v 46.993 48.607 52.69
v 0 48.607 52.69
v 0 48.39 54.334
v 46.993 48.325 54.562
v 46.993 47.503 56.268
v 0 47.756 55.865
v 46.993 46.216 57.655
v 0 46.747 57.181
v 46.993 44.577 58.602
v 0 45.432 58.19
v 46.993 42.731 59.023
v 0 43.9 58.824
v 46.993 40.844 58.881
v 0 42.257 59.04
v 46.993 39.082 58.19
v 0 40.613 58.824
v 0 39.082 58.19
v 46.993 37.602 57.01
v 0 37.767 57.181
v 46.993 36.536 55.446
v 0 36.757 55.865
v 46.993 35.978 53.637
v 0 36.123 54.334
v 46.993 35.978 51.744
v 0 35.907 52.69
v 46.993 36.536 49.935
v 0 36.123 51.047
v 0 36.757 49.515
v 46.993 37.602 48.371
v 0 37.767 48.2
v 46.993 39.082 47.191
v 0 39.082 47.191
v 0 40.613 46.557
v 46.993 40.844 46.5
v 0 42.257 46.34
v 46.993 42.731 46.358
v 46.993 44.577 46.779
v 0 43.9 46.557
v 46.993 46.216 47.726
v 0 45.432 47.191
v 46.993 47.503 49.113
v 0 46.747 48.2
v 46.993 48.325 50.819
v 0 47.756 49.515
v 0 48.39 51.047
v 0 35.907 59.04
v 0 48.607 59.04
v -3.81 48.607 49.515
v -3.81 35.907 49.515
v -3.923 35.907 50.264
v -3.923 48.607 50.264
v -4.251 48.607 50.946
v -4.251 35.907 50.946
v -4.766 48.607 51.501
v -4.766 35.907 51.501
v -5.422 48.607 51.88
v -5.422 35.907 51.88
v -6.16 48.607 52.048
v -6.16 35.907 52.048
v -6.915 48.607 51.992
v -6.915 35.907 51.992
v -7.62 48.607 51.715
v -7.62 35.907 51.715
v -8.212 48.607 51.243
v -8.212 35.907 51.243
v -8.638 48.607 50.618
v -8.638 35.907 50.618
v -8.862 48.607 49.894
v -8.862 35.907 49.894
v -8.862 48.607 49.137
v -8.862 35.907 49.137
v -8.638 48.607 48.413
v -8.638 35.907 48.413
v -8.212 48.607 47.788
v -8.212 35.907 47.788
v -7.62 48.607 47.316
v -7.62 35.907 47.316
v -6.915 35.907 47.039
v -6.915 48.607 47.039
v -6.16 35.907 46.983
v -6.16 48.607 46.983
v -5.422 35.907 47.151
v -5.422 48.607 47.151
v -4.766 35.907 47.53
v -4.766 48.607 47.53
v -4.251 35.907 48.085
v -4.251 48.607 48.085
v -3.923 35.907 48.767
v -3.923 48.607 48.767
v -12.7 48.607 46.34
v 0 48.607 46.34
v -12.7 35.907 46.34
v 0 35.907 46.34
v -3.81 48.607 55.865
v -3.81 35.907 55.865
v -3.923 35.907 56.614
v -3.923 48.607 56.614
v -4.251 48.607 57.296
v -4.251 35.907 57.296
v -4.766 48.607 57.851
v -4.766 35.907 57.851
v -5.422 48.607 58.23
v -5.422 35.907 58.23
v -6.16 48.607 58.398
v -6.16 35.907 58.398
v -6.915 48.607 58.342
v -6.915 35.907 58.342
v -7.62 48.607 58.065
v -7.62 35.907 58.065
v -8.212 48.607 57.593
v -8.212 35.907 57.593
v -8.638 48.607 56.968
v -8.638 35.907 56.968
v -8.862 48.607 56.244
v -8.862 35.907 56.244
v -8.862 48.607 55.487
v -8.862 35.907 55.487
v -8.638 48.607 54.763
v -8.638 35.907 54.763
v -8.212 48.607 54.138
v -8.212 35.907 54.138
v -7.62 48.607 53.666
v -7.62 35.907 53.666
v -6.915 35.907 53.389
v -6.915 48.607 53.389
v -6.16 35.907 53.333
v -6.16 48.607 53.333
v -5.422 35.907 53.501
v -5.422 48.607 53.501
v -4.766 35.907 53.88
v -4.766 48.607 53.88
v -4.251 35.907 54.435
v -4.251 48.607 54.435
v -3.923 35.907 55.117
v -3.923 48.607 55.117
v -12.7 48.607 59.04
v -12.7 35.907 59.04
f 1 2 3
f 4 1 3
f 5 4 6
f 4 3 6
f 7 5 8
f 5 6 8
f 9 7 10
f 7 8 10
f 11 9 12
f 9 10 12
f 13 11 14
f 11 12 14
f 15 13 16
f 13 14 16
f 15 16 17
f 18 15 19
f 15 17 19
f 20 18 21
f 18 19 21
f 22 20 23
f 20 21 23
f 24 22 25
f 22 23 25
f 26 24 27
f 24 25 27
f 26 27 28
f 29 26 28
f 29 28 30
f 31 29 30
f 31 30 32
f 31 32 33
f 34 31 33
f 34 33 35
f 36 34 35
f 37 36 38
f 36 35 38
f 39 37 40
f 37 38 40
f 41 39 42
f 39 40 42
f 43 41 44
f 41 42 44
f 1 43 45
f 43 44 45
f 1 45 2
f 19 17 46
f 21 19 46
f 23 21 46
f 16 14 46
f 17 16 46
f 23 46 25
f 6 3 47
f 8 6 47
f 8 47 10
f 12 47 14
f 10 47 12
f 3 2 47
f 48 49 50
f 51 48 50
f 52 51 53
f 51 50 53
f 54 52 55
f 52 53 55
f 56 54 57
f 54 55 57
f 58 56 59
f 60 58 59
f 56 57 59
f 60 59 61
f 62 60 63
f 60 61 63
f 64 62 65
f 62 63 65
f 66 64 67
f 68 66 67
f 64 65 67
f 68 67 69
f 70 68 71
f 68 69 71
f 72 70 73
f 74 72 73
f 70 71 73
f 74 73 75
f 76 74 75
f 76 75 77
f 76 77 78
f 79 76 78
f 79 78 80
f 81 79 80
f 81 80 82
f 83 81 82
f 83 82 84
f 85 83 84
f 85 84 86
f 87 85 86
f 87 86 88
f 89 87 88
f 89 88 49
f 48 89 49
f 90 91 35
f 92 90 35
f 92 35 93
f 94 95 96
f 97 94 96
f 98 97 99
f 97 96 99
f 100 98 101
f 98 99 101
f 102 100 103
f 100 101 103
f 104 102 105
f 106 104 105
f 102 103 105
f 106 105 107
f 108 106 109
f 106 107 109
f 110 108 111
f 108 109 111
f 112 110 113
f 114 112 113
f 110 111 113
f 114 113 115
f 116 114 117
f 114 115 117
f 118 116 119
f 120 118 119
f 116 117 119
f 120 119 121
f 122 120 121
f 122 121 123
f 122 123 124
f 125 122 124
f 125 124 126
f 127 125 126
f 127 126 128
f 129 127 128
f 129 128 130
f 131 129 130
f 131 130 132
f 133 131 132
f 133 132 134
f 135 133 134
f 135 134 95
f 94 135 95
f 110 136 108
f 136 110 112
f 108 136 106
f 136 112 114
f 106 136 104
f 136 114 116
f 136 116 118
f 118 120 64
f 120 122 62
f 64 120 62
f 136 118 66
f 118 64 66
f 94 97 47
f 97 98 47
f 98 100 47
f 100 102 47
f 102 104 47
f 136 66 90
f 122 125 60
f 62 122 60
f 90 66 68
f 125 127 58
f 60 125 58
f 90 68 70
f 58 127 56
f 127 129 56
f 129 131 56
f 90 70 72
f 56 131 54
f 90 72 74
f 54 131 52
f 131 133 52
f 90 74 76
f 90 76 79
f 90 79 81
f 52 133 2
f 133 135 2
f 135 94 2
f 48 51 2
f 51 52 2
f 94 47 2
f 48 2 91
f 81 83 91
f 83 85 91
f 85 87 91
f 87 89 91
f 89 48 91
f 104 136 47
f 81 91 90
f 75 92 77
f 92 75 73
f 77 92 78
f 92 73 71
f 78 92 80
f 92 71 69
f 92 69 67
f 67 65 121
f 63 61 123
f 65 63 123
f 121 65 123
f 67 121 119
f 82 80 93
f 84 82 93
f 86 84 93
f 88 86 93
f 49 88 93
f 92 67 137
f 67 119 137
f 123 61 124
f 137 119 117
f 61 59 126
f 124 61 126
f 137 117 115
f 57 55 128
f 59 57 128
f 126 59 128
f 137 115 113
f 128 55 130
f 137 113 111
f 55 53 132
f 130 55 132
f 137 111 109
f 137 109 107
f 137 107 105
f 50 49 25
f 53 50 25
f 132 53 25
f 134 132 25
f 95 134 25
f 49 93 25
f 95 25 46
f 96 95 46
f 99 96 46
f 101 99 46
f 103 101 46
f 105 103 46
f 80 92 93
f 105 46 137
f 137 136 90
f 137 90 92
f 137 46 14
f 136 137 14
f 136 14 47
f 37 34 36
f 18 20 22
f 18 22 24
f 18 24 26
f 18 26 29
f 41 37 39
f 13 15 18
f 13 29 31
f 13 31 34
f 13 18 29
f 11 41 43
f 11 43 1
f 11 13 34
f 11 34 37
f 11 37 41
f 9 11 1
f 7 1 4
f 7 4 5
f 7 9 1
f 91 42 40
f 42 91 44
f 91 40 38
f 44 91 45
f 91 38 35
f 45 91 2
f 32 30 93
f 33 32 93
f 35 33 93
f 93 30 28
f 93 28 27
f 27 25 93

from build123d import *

# Parameters (mm, degrees)
F0_R     = 6.35
F1_DEPTH = 46.99328
F3_DEPTH = 12.7
F5_D     = 5.08
F5_DEPTH = 25.4
F5_TIP   = 1.5261859723


with BuildPart() as f1:
    # F0 (on Right) → F1 (new body)
    with BuildSketch(Plane.YZ):
        with Locations((42.2567352653, 52.6904910803)):
            Circle(F0_R)
    extrude(amount=F1_DEPTH)

    # F2 (on face) → F3 (join)
    with BuildSketch(Plane(origin=(0, 0, 0), x_dir=(0, -1, 0), z_dir=(-1, 0, 0))):
        with BuildLine():
            Line((-42.2567352653, 59.0404910803), (-48.6067352653, 59.0404910803))
            Line((-48.6067352653, 59.0404910803), (-48.6067352653, 52.6904910803))
            ThreePointArc((-48.6067352653, 52.6904910803), (-46.7468633258, 57.1806191408), (-42.2567352653, 59.0404910803))
        make_face()
        with BuildLine():
            Line((-35.9067352653, 59.0404910803), (-42.2567352653, 59.0404910803))
            ThreePointArc((-42.2567352653, 59.0404910803), (-37.7666072047, 57.1806191408), (-35.9067352653, 52.6904910803))
            Line((-35.9067352653, 52.6904910803), (-35.9067352653, 59.0404910803))
        make_face()
        with BuildLine():
            ThreePointArc((-35.9067352653, 52.6904910803), (-37.7666072047, 57.1806191408), (-42.2567352653, 59.0404910803))
            ThreePointArc((-42.2567352653, 59.0404910803), (-46.7468633258, 57.1806191408), (-48.6067352653, 52.6904910803))
            ThreePointArc((-48.6067352653, 52.6904910803), (-46.7468633258, 48.2003630197), (-42.2567352653, 46.3404910803))
            ThreePointArc((-42.2567352653, 46.3404910803), (-37.7666072047, 48.2003630197), (-35.9067352653, 52.6904910803))
        make_face()
        with BuildLine():
            ThreePointArc((-42.2567352653, 46.3404910803), (-46.7468633258, 48.2003630197), (-48.6067352653, 52.6904910803))
            Line((-48.6067352653, 52.6904910803), (-48.6067352653, 46.3404910803))
            Line((-48.6067352653, 46.3404910803), (-42.2567352653, 46.3404910803))
        make_face()
        with BuildLine():
            Line((-35.9067352653, 46.3404910803), (-35.9067352653, 52.6904910803))
            ThreePointArc((-35.9067352653, 52.6904910803), (-37.7666072047, 48.2003630197), (-42.2567352653, 46.3404910803))
            Line((-42.2567352653, 46.3404910803), (-35.9067352653, 46.3404910803))
        make_face()
    extrude(amount=F3_DEPTH)

    # F5
    with Locations(Plane(origin=(0, 48.6067352653, 0), x_dir=(-1, 0, 0), z_dir=(0, 1, 0))):
        with Locations((6.35, 55.8654910803), (6.35, 49.5154910803)):
            Hole(F5_D / 2, depth=F5_DEPTH)
            with Locations((0, 0, -(F5_DEPTH + F5_TIP / 2))):  # 118° drill point
                Cone(0, F5_D / 2, F5_TIP, mode=Mode.SUBTRACT)


solid = f1.part
